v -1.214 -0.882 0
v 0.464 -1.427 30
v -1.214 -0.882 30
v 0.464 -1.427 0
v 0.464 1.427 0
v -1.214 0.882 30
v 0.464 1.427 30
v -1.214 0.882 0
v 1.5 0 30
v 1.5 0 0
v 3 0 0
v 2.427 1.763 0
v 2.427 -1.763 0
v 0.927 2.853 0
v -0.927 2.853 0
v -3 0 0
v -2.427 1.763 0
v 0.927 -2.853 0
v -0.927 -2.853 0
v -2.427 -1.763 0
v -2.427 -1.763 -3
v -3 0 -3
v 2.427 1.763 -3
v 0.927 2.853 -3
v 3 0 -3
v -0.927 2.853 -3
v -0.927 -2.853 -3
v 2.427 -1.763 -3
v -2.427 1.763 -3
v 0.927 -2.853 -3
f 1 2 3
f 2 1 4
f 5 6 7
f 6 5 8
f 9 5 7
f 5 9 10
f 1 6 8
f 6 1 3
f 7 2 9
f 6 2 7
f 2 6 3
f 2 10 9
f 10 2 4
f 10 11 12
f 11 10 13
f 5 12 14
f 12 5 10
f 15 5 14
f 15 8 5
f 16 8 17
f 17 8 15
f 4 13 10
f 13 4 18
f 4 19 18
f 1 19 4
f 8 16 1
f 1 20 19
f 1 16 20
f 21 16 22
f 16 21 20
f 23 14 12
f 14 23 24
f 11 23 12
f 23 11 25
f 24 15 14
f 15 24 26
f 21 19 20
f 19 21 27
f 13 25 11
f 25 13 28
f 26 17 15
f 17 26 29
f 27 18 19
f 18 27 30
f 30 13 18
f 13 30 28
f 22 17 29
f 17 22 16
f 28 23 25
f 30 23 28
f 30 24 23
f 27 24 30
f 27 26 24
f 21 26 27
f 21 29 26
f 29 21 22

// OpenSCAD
length = 30;
radius = 1.5;
module m3_screw() {
    translate([0, 0, length/2])
        cylinder(h=length, r=radius, center=true);
    translate([0, 0, -1.5])
        cylinder(h=3, r=3, center=true);
}

m3_screw();
